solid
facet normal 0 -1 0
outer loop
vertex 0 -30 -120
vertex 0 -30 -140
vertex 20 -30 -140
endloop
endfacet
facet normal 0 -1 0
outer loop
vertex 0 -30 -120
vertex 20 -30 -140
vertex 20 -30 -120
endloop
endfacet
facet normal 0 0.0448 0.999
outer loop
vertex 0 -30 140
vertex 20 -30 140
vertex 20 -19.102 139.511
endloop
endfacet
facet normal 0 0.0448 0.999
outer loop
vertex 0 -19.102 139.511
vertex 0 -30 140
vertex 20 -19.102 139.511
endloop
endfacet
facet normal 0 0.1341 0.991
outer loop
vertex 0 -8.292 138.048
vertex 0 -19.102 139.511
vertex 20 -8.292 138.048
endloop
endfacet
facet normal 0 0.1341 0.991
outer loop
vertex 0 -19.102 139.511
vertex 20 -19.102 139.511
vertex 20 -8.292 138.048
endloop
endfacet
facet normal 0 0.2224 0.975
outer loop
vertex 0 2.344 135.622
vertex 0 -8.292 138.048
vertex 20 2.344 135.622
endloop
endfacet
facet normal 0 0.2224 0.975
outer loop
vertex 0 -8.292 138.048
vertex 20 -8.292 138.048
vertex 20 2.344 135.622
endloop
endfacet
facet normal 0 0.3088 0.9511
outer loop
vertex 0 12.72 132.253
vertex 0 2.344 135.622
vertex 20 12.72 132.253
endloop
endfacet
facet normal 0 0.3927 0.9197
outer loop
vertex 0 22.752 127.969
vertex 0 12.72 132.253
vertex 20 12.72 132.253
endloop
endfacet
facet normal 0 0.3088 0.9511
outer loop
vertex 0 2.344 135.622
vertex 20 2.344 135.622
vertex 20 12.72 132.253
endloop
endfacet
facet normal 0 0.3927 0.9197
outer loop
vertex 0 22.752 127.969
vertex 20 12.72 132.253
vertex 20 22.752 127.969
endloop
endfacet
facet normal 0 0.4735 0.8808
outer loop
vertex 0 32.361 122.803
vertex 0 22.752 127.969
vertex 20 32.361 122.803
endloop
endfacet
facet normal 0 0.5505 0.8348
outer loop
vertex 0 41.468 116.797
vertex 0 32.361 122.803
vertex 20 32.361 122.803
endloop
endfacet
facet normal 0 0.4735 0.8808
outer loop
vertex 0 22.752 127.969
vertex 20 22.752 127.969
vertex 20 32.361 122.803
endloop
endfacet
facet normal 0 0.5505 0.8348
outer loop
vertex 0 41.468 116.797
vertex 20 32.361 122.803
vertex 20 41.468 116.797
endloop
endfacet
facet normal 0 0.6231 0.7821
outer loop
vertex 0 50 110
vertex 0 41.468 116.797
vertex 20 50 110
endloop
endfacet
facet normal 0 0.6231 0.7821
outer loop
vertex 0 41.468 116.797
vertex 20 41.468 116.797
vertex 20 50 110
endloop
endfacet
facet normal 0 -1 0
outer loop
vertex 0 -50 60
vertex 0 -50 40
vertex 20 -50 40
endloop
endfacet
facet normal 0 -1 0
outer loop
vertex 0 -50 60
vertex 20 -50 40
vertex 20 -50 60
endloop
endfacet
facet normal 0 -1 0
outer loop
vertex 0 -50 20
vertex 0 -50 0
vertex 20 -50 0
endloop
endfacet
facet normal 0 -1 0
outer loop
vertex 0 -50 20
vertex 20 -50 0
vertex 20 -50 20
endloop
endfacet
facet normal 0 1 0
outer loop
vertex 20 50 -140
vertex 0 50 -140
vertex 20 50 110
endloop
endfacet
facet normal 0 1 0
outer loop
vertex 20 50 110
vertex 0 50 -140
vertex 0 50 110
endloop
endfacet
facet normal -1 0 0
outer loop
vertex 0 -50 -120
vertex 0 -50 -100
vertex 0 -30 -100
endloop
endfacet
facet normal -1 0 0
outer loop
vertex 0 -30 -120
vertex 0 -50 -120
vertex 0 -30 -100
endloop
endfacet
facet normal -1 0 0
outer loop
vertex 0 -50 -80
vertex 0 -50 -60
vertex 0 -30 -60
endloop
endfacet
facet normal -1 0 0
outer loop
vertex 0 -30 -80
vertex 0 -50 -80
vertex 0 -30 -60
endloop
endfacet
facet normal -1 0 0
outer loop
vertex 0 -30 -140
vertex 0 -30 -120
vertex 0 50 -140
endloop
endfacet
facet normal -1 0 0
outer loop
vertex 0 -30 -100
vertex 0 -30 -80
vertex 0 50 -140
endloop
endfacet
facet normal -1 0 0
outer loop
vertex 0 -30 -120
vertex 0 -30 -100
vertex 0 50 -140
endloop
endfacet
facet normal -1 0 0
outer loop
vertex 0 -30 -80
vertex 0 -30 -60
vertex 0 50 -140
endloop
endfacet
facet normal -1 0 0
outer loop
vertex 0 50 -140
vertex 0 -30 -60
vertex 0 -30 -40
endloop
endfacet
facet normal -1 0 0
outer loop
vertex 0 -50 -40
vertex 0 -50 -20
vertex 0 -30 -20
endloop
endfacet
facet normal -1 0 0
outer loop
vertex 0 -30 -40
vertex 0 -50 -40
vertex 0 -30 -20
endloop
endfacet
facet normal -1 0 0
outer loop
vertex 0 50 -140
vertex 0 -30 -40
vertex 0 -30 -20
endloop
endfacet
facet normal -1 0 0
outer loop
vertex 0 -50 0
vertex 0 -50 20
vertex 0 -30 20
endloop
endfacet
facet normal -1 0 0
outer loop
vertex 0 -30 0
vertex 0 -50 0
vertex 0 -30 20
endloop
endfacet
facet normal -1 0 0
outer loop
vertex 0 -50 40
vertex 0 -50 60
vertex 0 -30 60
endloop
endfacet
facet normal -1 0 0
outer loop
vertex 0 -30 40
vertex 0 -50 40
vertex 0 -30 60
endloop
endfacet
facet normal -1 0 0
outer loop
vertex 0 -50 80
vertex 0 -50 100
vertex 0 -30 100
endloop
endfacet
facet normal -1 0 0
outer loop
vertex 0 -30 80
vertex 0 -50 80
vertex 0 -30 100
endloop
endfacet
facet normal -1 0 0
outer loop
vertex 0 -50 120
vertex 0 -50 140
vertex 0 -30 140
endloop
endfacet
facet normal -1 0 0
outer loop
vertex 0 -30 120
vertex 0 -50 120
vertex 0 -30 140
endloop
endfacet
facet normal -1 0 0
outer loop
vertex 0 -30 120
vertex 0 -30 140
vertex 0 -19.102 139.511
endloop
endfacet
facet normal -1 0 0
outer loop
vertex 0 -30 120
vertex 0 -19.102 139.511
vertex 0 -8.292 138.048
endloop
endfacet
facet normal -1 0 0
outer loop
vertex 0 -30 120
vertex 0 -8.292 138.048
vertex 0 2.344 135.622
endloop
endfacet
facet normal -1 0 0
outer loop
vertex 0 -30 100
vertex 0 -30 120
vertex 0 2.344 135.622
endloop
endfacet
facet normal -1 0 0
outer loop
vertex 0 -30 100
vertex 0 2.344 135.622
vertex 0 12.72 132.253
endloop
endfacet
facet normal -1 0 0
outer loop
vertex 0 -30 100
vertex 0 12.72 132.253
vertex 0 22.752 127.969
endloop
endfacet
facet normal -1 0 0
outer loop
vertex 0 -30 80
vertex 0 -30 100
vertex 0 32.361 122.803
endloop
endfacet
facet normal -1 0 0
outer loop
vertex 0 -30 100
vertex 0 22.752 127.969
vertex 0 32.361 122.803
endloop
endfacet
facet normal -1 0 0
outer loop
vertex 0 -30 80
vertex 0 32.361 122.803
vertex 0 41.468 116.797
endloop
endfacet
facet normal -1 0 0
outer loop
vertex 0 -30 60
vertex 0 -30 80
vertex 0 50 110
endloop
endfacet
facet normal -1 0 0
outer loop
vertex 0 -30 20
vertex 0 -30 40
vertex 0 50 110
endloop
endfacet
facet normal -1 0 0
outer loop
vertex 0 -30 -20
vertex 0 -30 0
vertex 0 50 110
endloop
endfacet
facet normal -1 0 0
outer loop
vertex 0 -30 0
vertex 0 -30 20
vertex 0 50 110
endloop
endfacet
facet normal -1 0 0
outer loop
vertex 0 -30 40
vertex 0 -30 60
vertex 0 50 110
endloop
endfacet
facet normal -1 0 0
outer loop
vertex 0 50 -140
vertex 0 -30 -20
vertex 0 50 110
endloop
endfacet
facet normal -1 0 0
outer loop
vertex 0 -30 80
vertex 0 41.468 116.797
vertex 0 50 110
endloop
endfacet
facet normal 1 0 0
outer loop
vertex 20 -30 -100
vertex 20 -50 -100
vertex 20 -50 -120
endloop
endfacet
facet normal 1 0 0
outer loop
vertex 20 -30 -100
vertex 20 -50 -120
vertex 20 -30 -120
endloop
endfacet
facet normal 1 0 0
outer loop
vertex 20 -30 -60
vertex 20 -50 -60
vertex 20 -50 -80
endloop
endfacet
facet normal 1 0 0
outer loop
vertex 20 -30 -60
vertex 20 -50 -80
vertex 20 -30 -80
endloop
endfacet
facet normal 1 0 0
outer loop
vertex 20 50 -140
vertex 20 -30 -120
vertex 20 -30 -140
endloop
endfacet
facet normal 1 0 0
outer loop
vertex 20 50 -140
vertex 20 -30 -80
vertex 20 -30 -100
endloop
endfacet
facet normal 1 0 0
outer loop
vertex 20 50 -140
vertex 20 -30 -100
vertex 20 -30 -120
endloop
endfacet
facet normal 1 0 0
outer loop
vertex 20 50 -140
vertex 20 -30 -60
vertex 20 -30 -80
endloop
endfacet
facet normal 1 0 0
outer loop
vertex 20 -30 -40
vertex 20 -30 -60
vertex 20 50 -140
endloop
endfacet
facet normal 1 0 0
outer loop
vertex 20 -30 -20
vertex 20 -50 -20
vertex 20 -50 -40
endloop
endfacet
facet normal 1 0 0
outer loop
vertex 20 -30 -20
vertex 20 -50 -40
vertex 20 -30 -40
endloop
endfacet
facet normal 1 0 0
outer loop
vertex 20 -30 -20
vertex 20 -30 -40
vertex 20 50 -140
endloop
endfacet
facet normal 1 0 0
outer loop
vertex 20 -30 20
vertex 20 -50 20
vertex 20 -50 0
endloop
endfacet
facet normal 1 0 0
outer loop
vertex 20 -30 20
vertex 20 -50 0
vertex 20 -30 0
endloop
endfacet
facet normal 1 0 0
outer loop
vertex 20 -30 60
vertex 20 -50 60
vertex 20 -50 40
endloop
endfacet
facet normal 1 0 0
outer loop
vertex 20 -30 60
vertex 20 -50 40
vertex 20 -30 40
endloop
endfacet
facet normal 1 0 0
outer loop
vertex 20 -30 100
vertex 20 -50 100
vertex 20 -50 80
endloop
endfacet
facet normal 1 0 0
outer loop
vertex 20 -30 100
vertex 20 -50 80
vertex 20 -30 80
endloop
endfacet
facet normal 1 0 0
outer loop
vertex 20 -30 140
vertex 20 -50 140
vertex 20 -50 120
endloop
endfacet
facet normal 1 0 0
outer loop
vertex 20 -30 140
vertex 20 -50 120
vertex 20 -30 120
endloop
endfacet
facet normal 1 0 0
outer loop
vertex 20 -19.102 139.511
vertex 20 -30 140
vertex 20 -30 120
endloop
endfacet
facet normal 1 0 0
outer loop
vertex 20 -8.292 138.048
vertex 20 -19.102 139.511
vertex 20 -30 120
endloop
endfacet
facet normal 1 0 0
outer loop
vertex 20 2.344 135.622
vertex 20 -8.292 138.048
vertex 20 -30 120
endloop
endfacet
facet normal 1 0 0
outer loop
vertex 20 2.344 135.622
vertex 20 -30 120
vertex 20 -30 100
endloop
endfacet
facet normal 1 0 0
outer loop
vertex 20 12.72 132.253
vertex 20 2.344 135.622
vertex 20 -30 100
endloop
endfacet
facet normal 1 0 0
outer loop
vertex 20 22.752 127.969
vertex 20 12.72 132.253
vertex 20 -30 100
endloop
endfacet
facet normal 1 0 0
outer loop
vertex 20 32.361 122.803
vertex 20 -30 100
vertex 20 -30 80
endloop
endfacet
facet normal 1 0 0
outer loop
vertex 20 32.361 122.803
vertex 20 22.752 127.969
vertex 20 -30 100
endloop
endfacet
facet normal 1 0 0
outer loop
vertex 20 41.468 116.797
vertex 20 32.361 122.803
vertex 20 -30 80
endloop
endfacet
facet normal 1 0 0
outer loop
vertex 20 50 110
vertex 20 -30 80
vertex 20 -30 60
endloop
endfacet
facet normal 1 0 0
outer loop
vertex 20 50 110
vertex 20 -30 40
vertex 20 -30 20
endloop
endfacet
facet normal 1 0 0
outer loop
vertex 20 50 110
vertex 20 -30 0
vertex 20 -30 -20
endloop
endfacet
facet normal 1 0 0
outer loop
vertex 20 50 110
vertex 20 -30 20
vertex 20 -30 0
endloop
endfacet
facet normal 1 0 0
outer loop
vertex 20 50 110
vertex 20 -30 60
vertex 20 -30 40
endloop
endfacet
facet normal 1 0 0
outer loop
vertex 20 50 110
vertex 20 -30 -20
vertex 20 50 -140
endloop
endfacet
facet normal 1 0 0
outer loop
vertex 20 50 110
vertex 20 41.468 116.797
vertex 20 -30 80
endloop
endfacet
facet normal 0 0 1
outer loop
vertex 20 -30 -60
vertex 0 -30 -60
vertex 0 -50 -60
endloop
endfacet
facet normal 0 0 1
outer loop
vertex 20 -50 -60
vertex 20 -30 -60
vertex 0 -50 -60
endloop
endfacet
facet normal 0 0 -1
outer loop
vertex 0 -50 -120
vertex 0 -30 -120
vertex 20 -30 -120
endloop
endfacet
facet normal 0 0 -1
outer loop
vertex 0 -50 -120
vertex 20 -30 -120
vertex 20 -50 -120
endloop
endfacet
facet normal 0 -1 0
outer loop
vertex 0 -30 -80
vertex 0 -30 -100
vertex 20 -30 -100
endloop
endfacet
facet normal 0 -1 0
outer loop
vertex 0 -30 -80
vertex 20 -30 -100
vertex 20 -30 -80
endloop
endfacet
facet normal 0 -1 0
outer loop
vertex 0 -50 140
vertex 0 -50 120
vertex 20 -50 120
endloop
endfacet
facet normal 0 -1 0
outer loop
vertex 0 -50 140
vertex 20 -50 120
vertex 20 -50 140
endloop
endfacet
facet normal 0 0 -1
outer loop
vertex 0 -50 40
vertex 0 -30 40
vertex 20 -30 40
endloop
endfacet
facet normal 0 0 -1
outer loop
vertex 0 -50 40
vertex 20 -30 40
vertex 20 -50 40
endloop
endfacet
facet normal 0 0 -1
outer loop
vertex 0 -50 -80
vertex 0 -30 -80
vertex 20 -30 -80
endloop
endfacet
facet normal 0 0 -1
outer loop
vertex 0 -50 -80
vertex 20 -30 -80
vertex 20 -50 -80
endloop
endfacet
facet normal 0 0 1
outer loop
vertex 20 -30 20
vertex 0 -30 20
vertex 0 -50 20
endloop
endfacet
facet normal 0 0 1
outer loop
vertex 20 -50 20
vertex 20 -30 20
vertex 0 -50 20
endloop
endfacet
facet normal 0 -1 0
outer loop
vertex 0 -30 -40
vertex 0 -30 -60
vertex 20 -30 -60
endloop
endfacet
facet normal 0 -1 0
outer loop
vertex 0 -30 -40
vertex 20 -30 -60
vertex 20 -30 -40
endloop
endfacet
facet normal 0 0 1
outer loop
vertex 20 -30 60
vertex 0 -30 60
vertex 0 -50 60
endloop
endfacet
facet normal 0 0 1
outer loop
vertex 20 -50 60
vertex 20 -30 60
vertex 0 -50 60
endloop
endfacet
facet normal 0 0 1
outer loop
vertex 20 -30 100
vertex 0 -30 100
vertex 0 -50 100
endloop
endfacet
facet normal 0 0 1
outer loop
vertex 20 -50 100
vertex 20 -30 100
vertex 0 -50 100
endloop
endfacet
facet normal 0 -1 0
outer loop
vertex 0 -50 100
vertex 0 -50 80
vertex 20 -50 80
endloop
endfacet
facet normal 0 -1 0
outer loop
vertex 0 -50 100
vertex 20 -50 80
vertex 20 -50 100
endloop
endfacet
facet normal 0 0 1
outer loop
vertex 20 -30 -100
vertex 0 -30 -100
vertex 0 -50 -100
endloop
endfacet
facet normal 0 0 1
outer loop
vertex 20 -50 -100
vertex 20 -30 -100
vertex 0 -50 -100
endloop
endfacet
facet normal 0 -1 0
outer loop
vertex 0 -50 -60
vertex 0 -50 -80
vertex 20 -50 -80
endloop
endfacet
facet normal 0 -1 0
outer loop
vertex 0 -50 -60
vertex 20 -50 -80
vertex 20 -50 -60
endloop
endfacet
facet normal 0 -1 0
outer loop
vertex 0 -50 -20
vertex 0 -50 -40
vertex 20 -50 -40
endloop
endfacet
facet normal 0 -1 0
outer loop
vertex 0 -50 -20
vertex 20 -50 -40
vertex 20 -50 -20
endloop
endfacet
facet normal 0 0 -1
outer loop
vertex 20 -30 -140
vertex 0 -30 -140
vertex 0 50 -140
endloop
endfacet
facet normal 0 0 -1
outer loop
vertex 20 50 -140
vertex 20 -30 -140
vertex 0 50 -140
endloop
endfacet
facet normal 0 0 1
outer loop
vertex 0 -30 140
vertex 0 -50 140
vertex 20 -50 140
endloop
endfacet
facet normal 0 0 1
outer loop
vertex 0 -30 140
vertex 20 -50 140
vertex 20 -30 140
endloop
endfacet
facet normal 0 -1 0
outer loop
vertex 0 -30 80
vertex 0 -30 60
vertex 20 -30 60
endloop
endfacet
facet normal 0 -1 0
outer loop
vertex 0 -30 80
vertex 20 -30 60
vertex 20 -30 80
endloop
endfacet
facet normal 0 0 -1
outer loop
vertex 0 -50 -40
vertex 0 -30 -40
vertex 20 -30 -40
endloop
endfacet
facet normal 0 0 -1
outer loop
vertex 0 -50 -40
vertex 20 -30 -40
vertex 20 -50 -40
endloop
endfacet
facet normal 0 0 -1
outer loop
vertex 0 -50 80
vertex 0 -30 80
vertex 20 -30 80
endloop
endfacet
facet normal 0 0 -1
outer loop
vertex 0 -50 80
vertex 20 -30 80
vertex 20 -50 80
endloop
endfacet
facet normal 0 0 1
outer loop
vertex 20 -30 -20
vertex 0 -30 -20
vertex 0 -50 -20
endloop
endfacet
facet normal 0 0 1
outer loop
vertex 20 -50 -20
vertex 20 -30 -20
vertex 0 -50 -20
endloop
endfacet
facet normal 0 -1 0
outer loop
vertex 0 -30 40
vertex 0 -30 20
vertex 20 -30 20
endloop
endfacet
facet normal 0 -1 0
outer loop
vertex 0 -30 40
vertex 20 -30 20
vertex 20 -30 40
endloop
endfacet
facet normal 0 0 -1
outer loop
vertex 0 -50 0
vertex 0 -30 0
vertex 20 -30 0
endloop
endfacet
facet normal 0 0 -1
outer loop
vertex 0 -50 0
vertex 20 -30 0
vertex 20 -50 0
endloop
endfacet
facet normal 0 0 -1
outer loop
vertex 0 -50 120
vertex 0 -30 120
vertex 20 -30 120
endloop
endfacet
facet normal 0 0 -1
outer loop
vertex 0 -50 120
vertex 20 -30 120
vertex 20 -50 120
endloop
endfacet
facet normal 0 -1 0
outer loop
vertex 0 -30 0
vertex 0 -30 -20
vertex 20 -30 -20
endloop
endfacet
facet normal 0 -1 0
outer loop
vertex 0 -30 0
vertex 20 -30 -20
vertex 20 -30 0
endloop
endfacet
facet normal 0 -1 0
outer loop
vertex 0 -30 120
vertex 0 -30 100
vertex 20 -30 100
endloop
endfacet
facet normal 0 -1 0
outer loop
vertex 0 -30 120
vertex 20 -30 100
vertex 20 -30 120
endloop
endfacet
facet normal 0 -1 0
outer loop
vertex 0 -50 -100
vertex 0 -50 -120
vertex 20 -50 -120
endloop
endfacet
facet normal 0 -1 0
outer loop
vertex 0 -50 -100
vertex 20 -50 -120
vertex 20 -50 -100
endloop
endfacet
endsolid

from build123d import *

# Parameters (mm, degrees)
F0_W     = 100
F0_H     = 280
F1_DEPTH = 20
F3_DEPTH = 20
F4_W     = 20
F4_H     = 20
F5_DEPTH = 20


# Not quite as in the source:
# - a feature names something its author has since deleted; it is built from what else it names


with BuildPart() as f1:
    # F0 (on Right) → F1 (new body)
    with BuildSketch(Plane.YZ):
        Rectangle(F0_W, F0_H)
    extrude(amount=F1_DEPTH)

    # F2 (on face) → F3 (cut, through all)
    with BuildSketch(Plane.YZ.offset(20)):
        with BuildLine():
            ThreePointArc((-30, 140), (12.7200187266, 132.2533832709), (50, 110))
            Line((50, 110), (50, 140))
            Line((50, 140), (-30, 140))
        make_face()
    extrude(amount=-F3_DEPTH, mode=Mode.SUBTRACT)

    # F4 (on face) → F5 (cut, through all)
    with BuildSketch(Plane(origin=(0, 0, 0), x_dir=(0, -1, 0), z_dir=(-1, 0, 0))):
        with Locations((40, -130)):
            Rectangle(F4_W, F4_H)
        with Locations((40, -90)):
            Rectangle(F4_W, F4_H)
        with Locations((40, -50)):
            Rectangle(F4_W, F4_H)
        with Locations((40, -10)):
            Rectangle(F4_W, F4_H)
        with Locations((40, 30)):
            Rectangle(F4_W, F4_H)
        with Locations((40, 70)):
            Rectangle(F4_W, F4_H)
        with Locations((40, 110)):
            Rectangle(F4_W, F4_H)
    extrude(amount=-F5_DEPTH, mode=Mode.SUBTRACT)


solid = f1.part
